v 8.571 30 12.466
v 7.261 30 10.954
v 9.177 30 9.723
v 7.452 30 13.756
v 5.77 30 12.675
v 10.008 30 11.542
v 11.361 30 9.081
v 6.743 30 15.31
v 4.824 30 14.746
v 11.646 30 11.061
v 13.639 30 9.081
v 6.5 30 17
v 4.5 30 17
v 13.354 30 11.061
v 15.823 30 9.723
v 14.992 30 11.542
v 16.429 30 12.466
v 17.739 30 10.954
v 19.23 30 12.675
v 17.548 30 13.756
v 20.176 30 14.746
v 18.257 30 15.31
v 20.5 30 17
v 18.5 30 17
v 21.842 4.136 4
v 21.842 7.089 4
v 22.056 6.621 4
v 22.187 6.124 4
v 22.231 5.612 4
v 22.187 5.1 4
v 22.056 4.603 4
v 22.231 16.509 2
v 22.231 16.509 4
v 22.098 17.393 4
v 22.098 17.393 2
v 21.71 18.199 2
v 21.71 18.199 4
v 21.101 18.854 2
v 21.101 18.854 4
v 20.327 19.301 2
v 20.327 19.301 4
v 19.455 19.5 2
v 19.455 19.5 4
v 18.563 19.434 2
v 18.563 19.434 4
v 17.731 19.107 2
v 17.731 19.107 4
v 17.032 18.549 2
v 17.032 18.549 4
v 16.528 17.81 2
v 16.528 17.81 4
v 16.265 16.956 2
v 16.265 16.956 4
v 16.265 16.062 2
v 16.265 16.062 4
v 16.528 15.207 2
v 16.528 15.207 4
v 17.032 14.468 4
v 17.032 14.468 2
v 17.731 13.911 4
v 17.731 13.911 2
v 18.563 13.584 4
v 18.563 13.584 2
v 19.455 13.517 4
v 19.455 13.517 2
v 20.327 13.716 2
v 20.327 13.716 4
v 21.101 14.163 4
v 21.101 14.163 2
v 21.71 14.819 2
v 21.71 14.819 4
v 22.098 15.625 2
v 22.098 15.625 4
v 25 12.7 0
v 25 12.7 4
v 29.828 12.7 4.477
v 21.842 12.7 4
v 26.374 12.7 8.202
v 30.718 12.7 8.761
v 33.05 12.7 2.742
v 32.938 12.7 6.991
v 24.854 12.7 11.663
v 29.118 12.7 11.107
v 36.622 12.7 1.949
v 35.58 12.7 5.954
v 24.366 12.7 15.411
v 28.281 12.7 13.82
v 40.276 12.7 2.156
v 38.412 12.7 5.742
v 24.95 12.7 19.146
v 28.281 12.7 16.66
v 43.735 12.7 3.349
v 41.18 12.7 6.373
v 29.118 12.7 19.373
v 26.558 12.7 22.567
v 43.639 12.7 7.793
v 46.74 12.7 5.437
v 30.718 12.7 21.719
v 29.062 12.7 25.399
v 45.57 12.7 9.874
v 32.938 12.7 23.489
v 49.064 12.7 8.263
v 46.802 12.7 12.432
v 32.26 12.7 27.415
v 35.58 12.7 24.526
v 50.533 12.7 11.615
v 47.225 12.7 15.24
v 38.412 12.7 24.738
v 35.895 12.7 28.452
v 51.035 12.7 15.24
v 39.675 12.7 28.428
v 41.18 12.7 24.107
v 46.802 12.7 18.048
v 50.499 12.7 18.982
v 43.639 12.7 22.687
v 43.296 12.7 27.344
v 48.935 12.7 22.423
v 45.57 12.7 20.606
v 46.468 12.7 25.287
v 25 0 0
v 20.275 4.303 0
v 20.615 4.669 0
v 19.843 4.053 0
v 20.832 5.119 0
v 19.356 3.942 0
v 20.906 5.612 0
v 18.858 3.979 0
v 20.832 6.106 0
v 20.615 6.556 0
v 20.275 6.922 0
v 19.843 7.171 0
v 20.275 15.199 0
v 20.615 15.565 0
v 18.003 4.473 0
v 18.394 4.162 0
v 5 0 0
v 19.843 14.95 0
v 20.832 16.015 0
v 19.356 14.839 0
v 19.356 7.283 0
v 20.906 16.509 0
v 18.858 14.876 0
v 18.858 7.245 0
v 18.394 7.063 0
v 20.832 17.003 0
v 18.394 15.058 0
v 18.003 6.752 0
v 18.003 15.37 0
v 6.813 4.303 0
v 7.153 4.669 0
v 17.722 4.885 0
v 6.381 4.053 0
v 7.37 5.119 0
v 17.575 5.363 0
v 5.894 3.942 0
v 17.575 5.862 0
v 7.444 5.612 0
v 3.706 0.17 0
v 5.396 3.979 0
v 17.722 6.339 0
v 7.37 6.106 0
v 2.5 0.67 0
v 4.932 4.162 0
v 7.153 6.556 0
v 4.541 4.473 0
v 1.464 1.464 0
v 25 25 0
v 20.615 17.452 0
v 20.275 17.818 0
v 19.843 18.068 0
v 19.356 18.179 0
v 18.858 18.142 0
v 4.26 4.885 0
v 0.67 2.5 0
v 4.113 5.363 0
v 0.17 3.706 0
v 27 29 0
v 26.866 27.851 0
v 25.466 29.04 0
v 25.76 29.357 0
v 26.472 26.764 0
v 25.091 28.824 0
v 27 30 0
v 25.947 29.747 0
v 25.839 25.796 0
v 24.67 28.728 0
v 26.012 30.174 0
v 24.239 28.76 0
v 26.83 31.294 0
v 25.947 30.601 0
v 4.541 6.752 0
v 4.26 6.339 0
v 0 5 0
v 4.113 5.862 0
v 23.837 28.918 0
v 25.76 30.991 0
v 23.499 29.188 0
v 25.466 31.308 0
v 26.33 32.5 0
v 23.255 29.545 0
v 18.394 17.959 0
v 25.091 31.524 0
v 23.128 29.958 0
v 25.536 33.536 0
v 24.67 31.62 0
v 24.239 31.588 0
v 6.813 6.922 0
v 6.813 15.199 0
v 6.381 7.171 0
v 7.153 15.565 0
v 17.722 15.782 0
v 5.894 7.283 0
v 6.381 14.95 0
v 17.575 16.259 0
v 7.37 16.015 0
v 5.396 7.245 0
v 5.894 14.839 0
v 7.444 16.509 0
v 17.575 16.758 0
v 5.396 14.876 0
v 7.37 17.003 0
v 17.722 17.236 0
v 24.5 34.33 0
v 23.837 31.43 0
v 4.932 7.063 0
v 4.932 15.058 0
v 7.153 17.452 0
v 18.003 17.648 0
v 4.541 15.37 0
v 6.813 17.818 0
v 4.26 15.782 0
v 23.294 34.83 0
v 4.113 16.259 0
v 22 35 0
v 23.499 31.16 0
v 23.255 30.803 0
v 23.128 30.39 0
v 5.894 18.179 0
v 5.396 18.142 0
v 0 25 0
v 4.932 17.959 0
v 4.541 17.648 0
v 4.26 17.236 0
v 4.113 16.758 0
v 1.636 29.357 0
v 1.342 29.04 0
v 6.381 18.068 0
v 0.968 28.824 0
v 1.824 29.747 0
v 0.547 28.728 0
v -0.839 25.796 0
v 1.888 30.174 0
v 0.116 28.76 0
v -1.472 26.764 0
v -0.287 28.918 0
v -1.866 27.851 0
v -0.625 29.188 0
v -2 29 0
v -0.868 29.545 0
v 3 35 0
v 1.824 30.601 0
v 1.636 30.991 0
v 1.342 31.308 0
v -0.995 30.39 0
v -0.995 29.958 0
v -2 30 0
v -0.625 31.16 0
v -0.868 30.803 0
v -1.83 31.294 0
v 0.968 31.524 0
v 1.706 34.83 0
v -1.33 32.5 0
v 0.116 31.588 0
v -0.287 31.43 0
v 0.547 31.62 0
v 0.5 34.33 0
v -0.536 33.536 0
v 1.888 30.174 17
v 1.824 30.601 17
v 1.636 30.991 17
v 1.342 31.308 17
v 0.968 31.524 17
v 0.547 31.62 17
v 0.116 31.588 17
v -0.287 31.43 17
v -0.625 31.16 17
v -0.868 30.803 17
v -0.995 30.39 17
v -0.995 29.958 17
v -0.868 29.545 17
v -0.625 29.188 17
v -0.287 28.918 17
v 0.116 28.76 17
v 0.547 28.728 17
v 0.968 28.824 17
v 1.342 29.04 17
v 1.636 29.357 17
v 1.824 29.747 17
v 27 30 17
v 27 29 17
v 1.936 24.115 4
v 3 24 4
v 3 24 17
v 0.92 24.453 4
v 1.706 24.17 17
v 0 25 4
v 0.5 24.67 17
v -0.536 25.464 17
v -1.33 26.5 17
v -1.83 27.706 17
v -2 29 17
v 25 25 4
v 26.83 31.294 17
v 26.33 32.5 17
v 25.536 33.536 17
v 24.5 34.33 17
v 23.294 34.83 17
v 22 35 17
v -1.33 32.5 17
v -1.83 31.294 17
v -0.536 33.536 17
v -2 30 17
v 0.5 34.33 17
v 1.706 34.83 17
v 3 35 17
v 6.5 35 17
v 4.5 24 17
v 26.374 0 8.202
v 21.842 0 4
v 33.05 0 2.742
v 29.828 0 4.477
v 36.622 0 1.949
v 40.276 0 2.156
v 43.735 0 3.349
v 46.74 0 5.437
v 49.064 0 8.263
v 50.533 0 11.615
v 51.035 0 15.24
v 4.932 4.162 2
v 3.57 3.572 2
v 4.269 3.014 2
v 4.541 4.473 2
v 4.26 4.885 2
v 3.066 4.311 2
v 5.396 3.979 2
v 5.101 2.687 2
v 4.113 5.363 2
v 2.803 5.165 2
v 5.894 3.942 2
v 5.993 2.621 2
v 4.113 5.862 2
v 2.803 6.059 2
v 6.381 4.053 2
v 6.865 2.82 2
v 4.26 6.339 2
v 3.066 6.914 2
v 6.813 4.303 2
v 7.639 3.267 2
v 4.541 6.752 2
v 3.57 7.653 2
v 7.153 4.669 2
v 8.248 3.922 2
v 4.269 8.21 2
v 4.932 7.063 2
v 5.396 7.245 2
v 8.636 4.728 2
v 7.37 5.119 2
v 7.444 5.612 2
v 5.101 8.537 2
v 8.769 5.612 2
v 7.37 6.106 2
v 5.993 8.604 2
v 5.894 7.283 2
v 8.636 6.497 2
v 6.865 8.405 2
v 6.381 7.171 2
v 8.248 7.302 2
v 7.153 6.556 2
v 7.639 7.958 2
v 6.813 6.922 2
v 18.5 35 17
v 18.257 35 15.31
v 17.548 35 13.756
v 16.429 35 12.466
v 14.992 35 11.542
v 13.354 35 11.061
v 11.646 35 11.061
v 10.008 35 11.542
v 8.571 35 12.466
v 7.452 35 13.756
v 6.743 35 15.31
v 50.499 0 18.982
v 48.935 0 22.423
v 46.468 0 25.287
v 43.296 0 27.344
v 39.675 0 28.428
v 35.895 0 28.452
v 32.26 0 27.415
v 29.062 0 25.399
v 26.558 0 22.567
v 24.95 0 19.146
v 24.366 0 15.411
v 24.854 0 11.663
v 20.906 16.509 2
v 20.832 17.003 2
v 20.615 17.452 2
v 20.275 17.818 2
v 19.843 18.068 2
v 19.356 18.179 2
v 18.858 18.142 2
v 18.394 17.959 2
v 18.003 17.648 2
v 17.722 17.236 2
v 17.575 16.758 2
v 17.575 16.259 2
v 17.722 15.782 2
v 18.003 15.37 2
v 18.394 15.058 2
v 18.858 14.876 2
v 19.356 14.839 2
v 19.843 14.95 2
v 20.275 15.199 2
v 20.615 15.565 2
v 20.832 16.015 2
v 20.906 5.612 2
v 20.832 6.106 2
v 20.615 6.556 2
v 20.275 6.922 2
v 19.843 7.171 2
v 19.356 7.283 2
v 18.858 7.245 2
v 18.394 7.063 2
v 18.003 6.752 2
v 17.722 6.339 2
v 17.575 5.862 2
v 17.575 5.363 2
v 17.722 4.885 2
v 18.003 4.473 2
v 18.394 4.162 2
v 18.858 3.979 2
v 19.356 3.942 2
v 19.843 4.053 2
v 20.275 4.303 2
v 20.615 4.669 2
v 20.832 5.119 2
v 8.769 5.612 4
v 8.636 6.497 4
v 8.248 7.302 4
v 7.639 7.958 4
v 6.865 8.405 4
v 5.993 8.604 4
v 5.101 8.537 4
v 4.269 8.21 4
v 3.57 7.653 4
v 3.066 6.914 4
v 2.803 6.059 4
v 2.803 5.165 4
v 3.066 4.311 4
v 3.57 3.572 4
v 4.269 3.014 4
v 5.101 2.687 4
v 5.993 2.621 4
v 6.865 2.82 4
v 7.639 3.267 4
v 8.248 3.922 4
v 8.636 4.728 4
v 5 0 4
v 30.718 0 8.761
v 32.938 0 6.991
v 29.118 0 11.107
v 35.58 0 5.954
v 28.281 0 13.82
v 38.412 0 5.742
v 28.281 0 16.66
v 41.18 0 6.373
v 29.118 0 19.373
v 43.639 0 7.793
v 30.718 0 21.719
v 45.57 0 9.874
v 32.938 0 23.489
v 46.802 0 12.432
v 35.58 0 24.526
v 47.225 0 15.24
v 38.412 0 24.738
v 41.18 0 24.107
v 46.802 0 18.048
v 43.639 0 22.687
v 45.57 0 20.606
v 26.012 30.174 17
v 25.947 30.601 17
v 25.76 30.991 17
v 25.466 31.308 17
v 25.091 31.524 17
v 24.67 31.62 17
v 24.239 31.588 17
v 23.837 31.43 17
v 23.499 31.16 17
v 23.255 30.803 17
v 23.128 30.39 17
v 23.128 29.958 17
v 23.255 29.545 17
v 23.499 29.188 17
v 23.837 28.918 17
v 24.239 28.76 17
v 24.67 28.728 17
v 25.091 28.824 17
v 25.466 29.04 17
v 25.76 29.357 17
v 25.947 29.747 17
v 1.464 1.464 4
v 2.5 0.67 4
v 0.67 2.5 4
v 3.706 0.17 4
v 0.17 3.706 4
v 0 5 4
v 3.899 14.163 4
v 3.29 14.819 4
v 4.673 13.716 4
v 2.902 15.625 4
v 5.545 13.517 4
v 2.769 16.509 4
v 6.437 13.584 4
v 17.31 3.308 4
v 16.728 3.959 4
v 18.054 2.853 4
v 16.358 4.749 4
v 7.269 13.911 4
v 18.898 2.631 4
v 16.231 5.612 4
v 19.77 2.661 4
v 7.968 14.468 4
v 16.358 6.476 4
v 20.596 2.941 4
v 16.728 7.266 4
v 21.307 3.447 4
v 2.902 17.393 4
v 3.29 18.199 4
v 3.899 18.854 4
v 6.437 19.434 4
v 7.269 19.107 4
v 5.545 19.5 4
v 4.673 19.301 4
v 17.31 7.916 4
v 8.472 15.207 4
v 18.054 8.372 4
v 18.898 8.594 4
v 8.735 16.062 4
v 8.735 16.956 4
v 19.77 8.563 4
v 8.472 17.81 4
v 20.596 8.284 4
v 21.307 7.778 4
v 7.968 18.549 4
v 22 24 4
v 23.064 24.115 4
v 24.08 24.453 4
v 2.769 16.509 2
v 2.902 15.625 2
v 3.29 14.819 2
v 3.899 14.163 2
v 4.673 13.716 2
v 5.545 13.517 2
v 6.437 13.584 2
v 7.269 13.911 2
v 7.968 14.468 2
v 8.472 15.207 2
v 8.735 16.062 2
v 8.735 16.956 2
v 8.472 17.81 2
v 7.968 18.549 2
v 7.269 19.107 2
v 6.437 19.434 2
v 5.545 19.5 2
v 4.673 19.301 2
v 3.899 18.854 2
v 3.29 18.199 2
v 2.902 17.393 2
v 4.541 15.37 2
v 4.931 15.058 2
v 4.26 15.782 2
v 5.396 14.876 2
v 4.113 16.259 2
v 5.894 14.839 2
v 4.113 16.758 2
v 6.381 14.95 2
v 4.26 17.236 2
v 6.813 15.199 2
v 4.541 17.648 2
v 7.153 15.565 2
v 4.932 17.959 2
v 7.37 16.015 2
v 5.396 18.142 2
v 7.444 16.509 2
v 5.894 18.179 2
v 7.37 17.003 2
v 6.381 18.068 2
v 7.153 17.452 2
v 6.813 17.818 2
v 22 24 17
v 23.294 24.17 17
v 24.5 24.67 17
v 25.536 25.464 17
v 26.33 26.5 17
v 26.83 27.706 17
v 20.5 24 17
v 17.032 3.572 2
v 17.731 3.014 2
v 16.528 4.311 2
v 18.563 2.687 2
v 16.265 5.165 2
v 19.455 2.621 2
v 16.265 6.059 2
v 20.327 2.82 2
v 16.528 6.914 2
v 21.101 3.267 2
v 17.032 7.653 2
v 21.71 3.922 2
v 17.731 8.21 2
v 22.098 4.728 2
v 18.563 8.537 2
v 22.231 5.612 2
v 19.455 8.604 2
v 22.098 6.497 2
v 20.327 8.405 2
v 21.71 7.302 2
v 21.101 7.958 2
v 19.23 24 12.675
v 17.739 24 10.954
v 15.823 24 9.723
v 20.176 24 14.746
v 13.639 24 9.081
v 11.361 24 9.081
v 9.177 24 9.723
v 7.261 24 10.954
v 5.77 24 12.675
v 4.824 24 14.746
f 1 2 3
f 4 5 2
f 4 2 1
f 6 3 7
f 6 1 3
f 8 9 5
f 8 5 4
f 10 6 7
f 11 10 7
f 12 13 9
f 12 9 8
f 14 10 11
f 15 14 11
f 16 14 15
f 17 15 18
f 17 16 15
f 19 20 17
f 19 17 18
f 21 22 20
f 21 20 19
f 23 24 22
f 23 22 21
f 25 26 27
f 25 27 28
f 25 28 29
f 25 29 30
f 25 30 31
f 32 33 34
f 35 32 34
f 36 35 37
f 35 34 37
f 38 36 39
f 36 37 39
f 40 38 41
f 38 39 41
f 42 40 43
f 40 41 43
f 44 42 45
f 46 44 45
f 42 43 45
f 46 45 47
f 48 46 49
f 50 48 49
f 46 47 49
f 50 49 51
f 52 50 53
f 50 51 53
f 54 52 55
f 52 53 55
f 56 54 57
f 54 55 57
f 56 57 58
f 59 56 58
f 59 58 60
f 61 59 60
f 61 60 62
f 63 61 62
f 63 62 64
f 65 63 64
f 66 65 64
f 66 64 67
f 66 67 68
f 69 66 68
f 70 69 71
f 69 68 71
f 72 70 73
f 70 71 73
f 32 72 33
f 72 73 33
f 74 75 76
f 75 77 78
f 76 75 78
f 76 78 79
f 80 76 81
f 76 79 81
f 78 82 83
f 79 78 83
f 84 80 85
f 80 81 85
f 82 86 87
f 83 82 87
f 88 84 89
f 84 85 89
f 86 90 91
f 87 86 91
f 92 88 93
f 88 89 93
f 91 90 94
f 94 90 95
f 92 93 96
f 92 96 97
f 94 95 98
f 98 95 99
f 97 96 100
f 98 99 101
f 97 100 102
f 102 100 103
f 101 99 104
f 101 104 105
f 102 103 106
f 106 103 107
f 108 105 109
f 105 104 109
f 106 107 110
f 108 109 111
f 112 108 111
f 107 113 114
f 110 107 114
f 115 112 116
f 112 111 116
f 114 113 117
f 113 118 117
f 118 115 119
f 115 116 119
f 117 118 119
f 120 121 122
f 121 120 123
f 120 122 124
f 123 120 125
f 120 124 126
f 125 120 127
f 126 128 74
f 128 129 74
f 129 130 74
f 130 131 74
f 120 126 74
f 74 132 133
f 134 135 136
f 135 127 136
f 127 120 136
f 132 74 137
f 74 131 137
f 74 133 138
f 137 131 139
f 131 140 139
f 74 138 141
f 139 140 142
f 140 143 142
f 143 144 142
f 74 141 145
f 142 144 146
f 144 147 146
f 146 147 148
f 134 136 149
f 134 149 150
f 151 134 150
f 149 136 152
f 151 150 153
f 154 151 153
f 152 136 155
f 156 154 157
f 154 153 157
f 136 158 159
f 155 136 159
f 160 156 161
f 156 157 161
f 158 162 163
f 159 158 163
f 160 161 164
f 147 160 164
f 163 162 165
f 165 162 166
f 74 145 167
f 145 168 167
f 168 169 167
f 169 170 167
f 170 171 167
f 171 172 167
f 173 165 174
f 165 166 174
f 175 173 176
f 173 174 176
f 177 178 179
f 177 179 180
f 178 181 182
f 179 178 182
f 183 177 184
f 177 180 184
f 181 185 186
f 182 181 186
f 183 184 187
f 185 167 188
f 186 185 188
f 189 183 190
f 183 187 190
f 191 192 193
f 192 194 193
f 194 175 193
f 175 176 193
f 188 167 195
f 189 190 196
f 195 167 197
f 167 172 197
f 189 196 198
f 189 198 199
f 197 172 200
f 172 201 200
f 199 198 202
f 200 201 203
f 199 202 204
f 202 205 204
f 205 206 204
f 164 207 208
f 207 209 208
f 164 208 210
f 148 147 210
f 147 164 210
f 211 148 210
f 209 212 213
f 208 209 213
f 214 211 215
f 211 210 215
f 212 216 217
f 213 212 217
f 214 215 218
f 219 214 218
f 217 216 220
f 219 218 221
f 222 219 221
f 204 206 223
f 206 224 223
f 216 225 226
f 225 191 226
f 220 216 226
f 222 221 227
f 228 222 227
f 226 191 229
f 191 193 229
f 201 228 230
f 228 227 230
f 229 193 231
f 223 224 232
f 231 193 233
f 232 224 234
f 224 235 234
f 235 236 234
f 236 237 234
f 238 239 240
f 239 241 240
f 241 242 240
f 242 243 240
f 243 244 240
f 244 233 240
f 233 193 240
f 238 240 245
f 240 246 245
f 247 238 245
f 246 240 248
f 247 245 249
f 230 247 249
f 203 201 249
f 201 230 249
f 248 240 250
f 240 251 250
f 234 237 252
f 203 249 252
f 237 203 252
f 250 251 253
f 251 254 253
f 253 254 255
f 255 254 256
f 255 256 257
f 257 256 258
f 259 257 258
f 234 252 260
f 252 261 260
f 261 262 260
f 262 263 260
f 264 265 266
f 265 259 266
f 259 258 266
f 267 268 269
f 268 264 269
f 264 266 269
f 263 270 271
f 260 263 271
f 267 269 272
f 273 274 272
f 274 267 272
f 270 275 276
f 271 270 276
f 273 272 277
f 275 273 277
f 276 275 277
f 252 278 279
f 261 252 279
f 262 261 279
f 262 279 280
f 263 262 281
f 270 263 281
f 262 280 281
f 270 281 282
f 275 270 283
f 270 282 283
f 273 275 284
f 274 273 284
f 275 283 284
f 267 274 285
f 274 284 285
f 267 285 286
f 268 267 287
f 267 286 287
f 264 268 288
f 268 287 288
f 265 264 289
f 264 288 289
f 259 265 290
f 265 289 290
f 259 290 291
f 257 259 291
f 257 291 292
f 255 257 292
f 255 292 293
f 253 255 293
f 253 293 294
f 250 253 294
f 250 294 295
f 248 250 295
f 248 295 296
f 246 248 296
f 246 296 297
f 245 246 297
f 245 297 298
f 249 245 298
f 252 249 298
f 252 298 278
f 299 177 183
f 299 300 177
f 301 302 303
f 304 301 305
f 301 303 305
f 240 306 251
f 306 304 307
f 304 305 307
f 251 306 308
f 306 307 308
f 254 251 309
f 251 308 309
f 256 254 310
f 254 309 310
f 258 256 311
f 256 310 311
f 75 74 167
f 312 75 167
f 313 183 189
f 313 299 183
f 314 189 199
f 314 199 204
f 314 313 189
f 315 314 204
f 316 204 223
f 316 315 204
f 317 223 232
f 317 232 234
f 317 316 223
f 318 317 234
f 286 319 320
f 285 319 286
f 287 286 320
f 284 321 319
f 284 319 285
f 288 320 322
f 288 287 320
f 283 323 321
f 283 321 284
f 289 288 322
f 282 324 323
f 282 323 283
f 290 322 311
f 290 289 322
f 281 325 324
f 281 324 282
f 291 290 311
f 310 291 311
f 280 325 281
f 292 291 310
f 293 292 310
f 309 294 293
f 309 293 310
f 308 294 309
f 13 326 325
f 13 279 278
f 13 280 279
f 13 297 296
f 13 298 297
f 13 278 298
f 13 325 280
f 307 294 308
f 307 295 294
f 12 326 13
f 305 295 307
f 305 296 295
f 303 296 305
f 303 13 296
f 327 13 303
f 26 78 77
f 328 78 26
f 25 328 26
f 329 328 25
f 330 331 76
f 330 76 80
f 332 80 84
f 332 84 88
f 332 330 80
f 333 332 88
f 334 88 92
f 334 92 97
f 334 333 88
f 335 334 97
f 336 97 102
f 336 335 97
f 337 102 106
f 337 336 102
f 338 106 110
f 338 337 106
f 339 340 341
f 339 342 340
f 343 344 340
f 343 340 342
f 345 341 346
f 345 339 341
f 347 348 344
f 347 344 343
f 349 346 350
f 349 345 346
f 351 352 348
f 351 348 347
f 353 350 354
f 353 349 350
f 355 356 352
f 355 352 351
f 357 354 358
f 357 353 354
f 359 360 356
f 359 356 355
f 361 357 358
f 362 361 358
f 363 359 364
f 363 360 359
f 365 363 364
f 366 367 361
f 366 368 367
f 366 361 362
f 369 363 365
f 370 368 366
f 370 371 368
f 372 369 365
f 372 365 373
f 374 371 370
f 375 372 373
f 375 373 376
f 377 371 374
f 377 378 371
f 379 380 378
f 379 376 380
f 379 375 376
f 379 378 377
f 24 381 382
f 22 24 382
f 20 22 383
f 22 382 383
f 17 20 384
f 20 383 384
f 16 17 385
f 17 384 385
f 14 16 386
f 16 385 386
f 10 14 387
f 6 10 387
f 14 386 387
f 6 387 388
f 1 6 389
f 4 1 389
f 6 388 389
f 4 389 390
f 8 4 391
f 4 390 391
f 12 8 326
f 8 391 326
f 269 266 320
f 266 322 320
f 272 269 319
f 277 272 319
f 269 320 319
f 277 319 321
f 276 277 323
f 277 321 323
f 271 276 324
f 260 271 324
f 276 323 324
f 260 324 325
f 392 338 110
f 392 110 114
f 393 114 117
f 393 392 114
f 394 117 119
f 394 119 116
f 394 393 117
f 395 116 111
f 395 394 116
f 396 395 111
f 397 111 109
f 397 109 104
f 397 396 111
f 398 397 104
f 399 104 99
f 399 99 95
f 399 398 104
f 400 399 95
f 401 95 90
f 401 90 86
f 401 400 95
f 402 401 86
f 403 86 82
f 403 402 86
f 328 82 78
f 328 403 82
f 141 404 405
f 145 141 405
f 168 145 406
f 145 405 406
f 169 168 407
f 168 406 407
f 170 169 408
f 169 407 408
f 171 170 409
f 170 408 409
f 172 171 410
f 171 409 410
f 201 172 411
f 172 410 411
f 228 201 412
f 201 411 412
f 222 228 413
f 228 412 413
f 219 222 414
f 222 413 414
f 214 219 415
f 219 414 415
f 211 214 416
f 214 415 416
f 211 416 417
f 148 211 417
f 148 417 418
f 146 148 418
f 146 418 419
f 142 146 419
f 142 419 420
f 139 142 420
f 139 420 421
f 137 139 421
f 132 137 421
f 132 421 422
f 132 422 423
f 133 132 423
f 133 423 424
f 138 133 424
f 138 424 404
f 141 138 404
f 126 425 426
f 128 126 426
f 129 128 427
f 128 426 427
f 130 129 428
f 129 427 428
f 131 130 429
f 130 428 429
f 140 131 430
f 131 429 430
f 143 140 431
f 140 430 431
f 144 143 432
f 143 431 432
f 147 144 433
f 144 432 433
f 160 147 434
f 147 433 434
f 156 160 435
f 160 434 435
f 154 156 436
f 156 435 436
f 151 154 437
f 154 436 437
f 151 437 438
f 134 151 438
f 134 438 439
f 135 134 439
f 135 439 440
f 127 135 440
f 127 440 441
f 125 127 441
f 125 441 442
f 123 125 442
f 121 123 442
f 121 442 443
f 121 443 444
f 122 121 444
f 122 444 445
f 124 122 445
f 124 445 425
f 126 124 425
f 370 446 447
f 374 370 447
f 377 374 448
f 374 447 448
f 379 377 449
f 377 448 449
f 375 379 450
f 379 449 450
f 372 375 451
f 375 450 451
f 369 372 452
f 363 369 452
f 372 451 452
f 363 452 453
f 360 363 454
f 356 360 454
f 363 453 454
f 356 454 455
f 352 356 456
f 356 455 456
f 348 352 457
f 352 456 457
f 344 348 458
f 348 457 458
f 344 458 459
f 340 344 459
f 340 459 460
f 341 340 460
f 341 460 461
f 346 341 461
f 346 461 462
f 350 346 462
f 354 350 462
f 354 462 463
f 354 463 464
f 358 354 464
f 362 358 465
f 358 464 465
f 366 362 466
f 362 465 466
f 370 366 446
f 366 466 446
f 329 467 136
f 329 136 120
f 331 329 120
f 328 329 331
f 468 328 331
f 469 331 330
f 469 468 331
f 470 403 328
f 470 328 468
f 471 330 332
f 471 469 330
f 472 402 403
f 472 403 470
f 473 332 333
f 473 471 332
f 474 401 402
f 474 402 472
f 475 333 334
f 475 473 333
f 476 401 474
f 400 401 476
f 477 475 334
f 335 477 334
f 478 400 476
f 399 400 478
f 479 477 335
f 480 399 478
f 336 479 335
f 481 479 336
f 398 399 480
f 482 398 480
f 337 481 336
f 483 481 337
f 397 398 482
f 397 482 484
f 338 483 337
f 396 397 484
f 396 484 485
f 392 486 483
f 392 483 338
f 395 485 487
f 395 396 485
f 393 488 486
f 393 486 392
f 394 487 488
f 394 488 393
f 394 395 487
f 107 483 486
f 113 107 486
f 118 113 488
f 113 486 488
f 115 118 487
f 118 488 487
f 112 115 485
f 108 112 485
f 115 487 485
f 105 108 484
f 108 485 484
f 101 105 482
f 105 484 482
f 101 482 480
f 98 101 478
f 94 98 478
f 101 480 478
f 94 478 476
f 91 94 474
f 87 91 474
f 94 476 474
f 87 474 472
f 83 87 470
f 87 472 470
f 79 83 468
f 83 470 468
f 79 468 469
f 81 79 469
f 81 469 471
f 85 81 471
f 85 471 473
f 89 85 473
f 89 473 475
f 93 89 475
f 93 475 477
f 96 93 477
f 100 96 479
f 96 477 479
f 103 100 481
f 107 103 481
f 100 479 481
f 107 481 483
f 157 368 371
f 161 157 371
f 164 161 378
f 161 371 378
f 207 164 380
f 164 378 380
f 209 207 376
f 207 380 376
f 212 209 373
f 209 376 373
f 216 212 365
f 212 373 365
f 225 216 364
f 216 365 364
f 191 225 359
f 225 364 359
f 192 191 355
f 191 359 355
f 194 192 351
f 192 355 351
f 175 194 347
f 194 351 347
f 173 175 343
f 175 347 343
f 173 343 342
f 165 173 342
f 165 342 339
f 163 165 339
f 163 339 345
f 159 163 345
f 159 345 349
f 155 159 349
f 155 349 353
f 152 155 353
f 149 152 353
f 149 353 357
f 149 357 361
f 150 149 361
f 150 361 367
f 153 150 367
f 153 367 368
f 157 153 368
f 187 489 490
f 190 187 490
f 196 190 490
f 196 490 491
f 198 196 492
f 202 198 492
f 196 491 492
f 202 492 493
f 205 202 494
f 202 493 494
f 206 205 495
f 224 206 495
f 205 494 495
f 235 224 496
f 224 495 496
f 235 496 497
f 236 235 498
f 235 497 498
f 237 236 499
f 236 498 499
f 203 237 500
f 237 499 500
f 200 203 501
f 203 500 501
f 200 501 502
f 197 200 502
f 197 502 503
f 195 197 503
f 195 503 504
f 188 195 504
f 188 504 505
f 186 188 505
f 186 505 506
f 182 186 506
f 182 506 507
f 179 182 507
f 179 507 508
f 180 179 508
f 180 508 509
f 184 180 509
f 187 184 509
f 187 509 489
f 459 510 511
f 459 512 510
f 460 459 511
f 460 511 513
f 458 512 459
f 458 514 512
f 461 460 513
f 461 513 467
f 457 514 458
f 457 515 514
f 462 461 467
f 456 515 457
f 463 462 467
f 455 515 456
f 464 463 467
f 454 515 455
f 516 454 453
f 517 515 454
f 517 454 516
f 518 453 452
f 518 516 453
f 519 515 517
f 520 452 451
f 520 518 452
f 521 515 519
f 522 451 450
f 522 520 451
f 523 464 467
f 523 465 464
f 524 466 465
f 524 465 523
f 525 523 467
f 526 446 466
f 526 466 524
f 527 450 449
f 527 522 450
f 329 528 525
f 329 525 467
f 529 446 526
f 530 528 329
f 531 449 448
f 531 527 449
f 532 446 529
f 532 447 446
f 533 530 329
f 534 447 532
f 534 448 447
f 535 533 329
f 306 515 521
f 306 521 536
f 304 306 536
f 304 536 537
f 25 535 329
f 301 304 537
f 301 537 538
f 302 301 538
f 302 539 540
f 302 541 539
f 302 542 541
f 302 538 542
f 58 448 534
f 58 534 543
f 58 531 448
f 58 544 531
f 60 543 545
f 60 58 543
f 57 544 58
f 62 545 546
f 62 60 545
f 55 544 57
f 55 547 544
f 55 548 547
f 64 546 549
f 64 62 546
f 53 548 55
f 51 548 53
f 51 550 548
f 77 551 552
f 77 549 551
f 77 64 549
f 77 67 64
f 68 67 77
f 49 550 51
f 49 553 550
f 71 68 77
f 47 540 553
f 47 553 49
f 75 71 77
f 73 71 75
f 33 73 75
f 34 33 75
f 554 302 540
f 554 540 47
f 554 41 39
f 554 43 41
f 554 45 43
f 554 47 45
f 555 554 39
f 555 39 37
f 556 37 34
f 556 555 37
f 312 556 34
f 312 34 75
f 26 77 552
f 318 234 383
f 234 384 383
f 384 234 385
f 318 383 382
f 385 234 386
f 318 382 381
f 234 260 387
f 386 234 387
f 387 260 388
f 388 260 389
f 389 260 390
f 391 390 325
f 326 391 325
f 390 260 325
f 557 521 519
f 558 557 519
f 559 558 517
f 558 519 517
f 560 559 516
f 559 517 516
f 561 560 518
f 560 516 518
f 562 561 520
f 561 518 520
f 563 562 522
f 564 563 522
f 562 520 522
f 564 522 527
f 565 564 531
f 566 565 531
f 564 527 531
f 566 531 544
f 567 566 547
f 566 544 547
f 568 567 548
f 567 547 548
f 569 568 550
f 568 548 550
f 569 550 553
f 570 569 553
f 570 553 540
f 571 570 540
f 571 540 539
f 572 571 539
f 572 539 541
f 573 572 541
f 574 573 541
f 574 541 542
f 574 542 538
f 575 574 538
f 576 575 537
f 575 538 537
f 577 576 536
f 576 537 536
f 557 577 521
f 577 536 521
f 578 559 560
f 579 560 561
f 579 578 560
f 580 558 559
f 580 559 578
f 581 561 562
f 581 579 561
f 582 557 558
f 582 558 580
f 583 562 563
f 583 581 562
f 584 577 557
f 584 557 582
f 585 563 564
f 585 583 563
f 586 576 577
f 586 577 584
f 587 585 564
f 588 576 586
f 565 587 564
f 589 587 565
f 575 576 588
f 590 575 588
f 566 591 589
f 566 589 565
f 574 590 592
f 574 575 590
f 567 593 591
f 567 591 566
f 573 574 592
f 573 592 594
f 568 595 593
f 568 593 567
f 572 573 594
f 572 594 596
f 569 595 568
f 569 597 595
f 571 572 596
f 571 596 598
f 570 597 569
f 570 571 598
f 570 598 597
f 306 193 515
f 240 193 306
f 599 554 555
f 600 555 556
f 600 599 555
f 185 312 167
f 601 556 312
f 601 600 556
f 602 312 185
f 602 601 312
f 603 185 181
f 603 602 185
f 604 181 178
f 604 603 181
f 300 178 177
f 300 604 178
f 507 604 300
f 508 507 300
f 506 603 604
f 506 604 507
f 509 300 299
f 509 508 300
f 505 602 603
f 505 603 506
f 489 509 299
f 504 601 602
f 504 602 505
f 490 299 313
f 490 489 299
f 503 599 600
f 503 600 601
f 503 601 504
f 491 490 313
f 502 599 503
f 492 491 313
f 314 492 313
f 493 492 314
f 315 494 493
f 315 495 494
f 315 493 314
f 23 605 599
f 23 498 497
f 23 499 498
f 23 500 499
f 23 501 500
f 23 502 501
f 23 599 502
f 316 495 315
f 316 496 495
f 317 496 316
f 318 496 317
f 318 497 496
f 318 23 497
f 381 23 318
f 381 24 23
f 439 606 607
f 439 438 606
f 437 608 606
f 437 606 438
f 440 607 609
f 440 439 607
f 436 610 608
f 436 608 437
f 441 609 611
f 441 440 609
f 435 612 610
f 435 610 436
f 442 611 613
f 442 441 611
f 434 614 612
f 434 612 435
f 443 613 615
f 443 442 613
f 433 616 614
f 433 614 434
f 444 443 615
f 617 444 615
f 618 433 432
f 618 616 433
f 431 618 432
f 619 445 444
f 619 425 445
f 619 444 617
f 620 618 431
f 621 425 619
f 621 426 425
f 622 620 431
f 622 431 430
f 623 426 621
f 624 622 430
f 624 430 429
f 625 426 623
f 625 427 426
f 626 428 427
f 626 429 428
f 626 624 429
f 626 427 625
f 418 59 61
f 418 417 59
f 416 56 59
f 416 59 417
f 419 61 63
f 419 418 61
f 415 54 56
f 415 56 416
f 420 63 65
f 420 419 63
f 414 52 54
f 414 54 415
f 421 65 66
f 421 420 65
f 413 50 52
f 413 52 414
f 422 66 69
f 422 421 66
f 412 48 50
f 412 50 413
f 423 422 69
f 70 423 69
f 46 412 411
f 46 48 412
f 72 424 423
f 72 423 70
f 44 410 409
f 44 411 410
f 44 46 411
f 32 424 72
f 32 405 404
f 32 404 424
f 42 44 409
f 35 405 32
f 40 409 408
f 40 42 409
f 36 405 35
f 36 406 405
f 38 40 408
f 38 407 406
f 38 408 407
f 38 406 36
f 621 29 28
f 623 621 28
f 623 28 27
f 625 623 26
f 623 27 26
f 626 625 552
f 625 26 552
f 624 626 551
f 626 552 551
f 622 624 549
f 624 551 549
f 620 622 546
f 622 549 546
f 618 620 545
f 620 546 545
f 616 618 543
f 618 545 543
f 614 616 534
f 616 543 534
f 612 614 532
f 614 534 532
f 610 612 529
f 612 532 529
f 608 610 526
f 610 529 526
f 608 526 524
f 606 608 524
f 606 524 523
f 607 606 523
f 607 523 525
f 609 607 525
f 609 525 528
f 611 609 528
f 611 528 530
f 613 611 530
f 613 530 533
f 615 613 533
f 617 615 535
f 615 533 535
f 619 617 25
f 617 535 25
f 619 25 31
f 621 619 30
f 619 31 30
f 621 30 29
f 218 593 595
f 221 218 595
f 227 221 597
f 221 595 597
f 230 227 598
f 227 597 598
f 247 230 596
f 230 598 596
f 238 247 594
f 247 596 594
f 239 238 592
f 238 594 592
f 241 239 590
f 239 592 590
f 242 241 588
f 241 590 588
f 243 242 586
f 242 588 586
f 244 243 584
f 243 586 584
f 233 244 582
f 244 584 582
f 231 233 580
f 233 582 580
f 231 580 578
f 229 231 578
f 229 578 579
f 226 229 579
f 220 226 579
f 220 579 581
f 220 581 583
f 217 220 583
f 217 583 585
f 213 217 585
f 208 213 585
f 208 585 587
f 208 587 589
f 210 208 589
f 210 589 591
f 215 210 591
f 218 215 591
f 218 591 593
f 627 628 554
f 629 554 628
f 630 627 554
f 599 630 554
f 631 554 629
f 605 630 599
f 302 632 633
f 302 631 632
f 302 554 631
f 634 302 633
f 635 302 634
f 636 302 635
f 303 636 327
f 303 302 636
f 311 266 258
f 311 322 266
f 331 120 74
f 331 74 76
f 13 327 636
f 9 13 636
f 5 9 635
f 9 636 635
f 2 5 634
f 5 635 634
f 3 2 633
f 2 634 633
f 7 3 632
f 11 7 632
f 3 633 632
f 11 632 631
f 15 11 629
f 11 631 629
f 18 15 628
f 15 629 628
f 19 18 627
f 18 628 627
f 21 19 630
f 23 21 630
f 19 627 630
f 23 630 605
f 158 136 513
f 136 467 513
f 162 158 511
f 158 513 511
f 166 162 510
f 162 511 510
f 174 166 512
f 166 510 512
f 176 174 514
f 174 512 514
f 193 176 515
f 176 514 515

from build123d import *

# Parameters (mm, degrees)
F0_W      = 25
F0_H      = 35
F1_DEPTH  = 4
F2_R      = 1.675
F3_DEPTH  = 25
F4_W      = 25
F4_H      = 11
F5_DEPTH  = 13
F7_DEPTH  = 6
F8_R      = 8
F9_DEPTH  = 6
F2_R_2    = 3
F10_DEPTH = 2
F11_W     = 11
F11_H     = 17
F12_DEPTH = 2
F13_W     = 11
F13_H     = 17
F14_DEPTH = 2
F15_R     = 1.45
F16_DEPTH = 25
F17_R     = 5
F18_R     = 9.525
F19_DEPTH = 12.7
F20_R     = 5


with BuildPart() as f1:
    # F0 (on Top) → F1 (new body)
    with BuildSketch(Plane.XY):
        with Locations((12.5, 17.5)):
            Rectangle(F0_W, F0_H)
    extrude(amount=F1_DEPTH)

    # F2 (on face) → F3 (cut)
    with BuildSketch(Plane.XY.offset(4)):
        with BuildLine():
            ThreePointArc((4.094, 16.5088346784), (5.769, 14.8338346784), (7.444, 16.5088346784))
            ThreePointArc((7.444, 16.5088346784), (5.769, 18.1838346784), (4.094, 16.5088346784))
        make_face()
        with Locations((19.231, 16.5088346784)):
            Circle(F2_R)
        with Locations((19.231, 5.6122346784)):
            Circle(F2_R)
        with Locations((5.769, 5.6122346784)):
            Circle(F2_R)
    extrude(amount=-F3_DEPTH, mode=Mode.SUBTRACT)

    # F4 (on face) → F5 (join)
    with BuildSketch(Plane.XY.offset(4)):
        with Locations((12.5, 29.5)):
            Rectangle(F4_W, F4_H)
    extrude(amount=F5_DEPTH)

    # F6 (on face) → F7 (cut)
    with BuildSketch(Plane(origin=(0, 35, 0), x_dir=(-1, 0, 0), z_dir=(0, 1, 0))):
        with BuildLine():
            ThreePointArc((-18.5, 17), (-12.5, 11), (-6.5, 17))
            Line((-6.5, 17), (-18.5, 17))
        make_face()
    extrude(amount=-F7_DEPTH, mode=Mode.SUBTRACT)

    # F8 (on face) → F9 (cut)
    with BuildSketch(Plane.XZ.offset(-24)):
        with Locations((12.5, 17)):
            Circle(F8_R)
    extrude(amount=-F9_DEPTH, mode=Mode.SUBTRACT)

    # F2 (on face) → F10 (cut)
    with BuildSketch(Plane.XY.offset(4)):
        with BuildLine():
            ThreePointArc((8.769, 16.5088346784), (5.769, 19.5088346784), (2.769, 16.5088346784))
            ThreePointArc((2.769, 16.5088346784), (5.769, 13.5088346784), (8.769, 16.5088346784))
        make_face()
        with BuildLine():
            ThreePointArc((4.094, 16.5088346784), (5.769, 18.1838346784), (7.444, 16.5088346784))
            ThreePointArc((7.444, 16.5088346784), (5.769, 14.8338346784), (4.094, 16.5088346784))
        make_face(mode=Mode.SUBTRACT)
        with Locations((19.231, 16.5088346784)):
            Circle(F2_R_2)
        with Locations((19.231, 16.5088346784)):
            Circle(F2_R, mode=Mode.SUBTRACT)
        with Locations((19.231, 5.6122346784)):
            Circle(F2_R_2)
        with Locations((19.231, 5.6122346784)):
            Circle(F2_R, mode=Mode.SUBTRACT)
        with Locations((5.769, 5.6122346784)):
            Circle(F2_R_2)
        with Locations((5.769, 5.6122346784)):
            Circle(F2_R, mode=Mode.SUBTRACT)
    extrude(amount=-F10_DEPTH, mode=Mode.SUBTRACT)

    # F11 (on face) → F12 (join)
    with BuildSketch(Plane(origin=(0, 0, 0), x_dir=(0, -1, 0), z_dir=(-1, 0, 0))):
        with Locations((-29.5, 8.5)):
            Rectangle(F11_W, F11_H)
    extrude(amount=F12_DEPTH)

    # F13 (on face) → F14 (join)
    with BuildSketch(Plane.YZ.offset(25)):
        with Locations((29.5, 8.5)):
            Rectangle(F13_W, F13_H)
    extrude(amount=F14_DEPTH)

    # F15 (on face) → F16 (cut)
    with BuildSketch(Plane.XY.offset(17)):
        with Locations((0.4384, 30.174)):
            Circle(F15_R)
        with Locations((24.5616, 30.174)):
            Circle(F15_R)
    extrude(amount=-F16_DEPTH, mode=Mode.SUBTRACT)

    # F17
    f17_edges = [f1.edges().sort_by_distance(p)[0] for p in [
        (-2, 24, 8.5),
        (-2, 35, 8.5),
        (27, 35, 8.5),
        (27, 24, 8.5),
    ]]
    fillet(f17_edges, radius=F17_R)

    # F18 (on face) → F19 (join)
    with BuildSketch(Plane.XZ):
        with BuildLine():
            Line((26.3737617011, 8.2016371934), (29.8278119435, 4.4765953247))
            ThreePointArc((29.8278119435, 4.4765953247), (43.7351717982, 3.3488719473), (51.035, 15.24))
            ThreePointArc((51.035, 15.24), (34.0402980118, 28.0629796209), (26.3737617011, 8.2016371934))
        make_face()
        with Locations((37.7, 15.24)):
            Circle(F18_R, mode=Mode.SUBTRACT)
        with BuildLine():
            Line((25, 4), (25, 0))
            Line((25, 0), (29.8278119435, 4.4765953247))
            ThreePointArc((29.8278119435, 4.4765953247), (27.9217650948, 6.1731181138), (26.3737617011, 8.2016371934))
            Line((26.3737617011, 8.2016371934), (21.8424800567, 4))
            Line((21.8424800567, 4), (25, 4))
        make_face()
        with BuildLine():
            ThreePointArc((26.3737617011, 8.2016371934), (27.9217650948, 6.1731181138), (29.8278119435, 4.4765953247))
            Line((29.8278119435, 4.4765953247), (26.3737617011, 8.2016371934))
        make_face()
    extrude(amount=-F19_DEPTH)

    # F20
    f20_edges = [f1.edges().sort_by_distance(p)[0] for p in [
        (0, 0, 2),
    ]]
    fillet(f20_edges, radius=F20_R)


solid = f1.part
